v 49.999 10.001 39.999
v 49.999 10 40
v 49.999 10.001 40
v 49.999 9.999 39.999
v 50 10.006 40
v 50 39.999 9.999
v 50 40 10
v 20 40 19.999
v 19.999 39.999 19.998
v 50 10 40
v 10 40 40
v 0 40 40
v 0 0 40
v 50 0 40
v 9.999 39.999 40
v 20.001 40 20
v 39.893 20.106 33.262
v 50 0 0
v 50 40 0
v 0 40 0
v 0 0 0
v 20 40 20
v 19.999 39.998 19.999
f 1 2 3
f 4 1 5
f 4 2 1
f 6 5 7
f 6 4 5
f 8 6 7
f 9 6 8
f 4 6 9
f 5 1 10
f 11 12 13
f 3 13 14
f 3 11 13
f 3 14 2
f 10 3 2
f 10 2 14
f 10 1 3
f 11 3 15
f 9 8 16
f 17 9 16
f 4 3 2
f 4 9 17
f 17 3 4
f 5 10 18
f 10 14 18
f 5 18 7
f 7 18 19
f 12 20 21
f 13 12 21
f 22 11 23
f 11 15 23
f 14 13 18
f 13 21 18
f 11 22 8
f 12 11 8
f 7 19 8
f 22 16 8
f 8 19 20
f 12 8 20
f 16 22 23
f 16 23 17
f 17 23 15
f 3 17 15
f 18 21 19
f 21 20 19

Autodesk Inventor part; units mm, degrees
ref_plane "YZ Plane" through (0, 0, 0) normal (1, 0, 0) x (0, 1, 0)
sketch "草圖1" plane through (0, 0, 0) normal (0, 0, 1) x (1, 0, 0)
  line L0 (0, 0) -> (50, 0)
  line L1 (50, 0) -> (50, 40)
  line L2 (50, 40) -> (0, 40)
  line L3 (0, 40) -> (0, 0)
  dimension "d0" = 50
  dimension "d1" = 40
extrude "擠出1" add sketch "草圖1" along normal blind 40
sketch "草圖7" plane through (0, 40, 0) normal (0, 1, 0) x (1, 0, 0)
  line L0 (0, -40) -> (50, -40) projected
  line L1 (0, 0) -> (0, -40) projected
  line L2 (50, 0) -> (0, 0) projected
  line L3 (50, 0) -> (50, -40) projected
  point P0 (50, -10)
  point P1 (20, -20)
  point P2 (10, -40)
  dimension "d13" = 10
  dimension "d14" = 20
  dimension "d15" = 20
  dimension "d16" = 10
sketch "草圖8" plane through (0, 0, 40) normal (0, 0, 1) x (1, 0, 0)
  line L0 (50, 0) -> (50, 40) projected
  line L1 (0, 0) -> (50, 0) projected
  line L2 (50, 0) -> (50, 40) projected
  line L3 (50, 40) -> (0, 40) projected
  line L4 (0, 40) -> (0, 0) projected
  point P0 (50, 10)
  dimension "d17" = 10
ref_plane "工作平面3" through (20, 40, 20) normal (0.5747, 0.7663, 0.2873) x (-0.4472, 0, 0.8944)
sketch "草圖9" plane through (20, 40, 20) normal (0.5747, 0.7663, 0.2873) x (-0.4472, 0, 0.8944)
  line L0 (0, 0) -> (4.4721, 46.6905)
  line L1 (4.4721, 46.6905) -> (22.3607, 0)
  line L2 (22.3607, 0) -> (0, 0)
  point P0 (-8.9443, 5.1402)
extrude "擠出4" cut sketch "草圖9" along normal blind 40
ref_plane "工作平面4" through (50, 40, 10) normal (0.2294, 0.6882, 0.6882) x (-0.9487, 0, 0.3162)
sketch "草圖11" plane through (50, 40, 10) normal (0.2294, 0.6882, 0.6882) x (-0.9487, 0, 0.3162)
  line L0 (31.6228, 0) -> (9.4868, 41.3521)
  line L1 (9.4868, 41.3521) -> (0, 0)
  line L2 (0, 0) -> (31.6228, 0)
  point P0 (44.2719, 11.6076)
extrude "擠出5" cut sketch "草圖11" along normal blind 40
